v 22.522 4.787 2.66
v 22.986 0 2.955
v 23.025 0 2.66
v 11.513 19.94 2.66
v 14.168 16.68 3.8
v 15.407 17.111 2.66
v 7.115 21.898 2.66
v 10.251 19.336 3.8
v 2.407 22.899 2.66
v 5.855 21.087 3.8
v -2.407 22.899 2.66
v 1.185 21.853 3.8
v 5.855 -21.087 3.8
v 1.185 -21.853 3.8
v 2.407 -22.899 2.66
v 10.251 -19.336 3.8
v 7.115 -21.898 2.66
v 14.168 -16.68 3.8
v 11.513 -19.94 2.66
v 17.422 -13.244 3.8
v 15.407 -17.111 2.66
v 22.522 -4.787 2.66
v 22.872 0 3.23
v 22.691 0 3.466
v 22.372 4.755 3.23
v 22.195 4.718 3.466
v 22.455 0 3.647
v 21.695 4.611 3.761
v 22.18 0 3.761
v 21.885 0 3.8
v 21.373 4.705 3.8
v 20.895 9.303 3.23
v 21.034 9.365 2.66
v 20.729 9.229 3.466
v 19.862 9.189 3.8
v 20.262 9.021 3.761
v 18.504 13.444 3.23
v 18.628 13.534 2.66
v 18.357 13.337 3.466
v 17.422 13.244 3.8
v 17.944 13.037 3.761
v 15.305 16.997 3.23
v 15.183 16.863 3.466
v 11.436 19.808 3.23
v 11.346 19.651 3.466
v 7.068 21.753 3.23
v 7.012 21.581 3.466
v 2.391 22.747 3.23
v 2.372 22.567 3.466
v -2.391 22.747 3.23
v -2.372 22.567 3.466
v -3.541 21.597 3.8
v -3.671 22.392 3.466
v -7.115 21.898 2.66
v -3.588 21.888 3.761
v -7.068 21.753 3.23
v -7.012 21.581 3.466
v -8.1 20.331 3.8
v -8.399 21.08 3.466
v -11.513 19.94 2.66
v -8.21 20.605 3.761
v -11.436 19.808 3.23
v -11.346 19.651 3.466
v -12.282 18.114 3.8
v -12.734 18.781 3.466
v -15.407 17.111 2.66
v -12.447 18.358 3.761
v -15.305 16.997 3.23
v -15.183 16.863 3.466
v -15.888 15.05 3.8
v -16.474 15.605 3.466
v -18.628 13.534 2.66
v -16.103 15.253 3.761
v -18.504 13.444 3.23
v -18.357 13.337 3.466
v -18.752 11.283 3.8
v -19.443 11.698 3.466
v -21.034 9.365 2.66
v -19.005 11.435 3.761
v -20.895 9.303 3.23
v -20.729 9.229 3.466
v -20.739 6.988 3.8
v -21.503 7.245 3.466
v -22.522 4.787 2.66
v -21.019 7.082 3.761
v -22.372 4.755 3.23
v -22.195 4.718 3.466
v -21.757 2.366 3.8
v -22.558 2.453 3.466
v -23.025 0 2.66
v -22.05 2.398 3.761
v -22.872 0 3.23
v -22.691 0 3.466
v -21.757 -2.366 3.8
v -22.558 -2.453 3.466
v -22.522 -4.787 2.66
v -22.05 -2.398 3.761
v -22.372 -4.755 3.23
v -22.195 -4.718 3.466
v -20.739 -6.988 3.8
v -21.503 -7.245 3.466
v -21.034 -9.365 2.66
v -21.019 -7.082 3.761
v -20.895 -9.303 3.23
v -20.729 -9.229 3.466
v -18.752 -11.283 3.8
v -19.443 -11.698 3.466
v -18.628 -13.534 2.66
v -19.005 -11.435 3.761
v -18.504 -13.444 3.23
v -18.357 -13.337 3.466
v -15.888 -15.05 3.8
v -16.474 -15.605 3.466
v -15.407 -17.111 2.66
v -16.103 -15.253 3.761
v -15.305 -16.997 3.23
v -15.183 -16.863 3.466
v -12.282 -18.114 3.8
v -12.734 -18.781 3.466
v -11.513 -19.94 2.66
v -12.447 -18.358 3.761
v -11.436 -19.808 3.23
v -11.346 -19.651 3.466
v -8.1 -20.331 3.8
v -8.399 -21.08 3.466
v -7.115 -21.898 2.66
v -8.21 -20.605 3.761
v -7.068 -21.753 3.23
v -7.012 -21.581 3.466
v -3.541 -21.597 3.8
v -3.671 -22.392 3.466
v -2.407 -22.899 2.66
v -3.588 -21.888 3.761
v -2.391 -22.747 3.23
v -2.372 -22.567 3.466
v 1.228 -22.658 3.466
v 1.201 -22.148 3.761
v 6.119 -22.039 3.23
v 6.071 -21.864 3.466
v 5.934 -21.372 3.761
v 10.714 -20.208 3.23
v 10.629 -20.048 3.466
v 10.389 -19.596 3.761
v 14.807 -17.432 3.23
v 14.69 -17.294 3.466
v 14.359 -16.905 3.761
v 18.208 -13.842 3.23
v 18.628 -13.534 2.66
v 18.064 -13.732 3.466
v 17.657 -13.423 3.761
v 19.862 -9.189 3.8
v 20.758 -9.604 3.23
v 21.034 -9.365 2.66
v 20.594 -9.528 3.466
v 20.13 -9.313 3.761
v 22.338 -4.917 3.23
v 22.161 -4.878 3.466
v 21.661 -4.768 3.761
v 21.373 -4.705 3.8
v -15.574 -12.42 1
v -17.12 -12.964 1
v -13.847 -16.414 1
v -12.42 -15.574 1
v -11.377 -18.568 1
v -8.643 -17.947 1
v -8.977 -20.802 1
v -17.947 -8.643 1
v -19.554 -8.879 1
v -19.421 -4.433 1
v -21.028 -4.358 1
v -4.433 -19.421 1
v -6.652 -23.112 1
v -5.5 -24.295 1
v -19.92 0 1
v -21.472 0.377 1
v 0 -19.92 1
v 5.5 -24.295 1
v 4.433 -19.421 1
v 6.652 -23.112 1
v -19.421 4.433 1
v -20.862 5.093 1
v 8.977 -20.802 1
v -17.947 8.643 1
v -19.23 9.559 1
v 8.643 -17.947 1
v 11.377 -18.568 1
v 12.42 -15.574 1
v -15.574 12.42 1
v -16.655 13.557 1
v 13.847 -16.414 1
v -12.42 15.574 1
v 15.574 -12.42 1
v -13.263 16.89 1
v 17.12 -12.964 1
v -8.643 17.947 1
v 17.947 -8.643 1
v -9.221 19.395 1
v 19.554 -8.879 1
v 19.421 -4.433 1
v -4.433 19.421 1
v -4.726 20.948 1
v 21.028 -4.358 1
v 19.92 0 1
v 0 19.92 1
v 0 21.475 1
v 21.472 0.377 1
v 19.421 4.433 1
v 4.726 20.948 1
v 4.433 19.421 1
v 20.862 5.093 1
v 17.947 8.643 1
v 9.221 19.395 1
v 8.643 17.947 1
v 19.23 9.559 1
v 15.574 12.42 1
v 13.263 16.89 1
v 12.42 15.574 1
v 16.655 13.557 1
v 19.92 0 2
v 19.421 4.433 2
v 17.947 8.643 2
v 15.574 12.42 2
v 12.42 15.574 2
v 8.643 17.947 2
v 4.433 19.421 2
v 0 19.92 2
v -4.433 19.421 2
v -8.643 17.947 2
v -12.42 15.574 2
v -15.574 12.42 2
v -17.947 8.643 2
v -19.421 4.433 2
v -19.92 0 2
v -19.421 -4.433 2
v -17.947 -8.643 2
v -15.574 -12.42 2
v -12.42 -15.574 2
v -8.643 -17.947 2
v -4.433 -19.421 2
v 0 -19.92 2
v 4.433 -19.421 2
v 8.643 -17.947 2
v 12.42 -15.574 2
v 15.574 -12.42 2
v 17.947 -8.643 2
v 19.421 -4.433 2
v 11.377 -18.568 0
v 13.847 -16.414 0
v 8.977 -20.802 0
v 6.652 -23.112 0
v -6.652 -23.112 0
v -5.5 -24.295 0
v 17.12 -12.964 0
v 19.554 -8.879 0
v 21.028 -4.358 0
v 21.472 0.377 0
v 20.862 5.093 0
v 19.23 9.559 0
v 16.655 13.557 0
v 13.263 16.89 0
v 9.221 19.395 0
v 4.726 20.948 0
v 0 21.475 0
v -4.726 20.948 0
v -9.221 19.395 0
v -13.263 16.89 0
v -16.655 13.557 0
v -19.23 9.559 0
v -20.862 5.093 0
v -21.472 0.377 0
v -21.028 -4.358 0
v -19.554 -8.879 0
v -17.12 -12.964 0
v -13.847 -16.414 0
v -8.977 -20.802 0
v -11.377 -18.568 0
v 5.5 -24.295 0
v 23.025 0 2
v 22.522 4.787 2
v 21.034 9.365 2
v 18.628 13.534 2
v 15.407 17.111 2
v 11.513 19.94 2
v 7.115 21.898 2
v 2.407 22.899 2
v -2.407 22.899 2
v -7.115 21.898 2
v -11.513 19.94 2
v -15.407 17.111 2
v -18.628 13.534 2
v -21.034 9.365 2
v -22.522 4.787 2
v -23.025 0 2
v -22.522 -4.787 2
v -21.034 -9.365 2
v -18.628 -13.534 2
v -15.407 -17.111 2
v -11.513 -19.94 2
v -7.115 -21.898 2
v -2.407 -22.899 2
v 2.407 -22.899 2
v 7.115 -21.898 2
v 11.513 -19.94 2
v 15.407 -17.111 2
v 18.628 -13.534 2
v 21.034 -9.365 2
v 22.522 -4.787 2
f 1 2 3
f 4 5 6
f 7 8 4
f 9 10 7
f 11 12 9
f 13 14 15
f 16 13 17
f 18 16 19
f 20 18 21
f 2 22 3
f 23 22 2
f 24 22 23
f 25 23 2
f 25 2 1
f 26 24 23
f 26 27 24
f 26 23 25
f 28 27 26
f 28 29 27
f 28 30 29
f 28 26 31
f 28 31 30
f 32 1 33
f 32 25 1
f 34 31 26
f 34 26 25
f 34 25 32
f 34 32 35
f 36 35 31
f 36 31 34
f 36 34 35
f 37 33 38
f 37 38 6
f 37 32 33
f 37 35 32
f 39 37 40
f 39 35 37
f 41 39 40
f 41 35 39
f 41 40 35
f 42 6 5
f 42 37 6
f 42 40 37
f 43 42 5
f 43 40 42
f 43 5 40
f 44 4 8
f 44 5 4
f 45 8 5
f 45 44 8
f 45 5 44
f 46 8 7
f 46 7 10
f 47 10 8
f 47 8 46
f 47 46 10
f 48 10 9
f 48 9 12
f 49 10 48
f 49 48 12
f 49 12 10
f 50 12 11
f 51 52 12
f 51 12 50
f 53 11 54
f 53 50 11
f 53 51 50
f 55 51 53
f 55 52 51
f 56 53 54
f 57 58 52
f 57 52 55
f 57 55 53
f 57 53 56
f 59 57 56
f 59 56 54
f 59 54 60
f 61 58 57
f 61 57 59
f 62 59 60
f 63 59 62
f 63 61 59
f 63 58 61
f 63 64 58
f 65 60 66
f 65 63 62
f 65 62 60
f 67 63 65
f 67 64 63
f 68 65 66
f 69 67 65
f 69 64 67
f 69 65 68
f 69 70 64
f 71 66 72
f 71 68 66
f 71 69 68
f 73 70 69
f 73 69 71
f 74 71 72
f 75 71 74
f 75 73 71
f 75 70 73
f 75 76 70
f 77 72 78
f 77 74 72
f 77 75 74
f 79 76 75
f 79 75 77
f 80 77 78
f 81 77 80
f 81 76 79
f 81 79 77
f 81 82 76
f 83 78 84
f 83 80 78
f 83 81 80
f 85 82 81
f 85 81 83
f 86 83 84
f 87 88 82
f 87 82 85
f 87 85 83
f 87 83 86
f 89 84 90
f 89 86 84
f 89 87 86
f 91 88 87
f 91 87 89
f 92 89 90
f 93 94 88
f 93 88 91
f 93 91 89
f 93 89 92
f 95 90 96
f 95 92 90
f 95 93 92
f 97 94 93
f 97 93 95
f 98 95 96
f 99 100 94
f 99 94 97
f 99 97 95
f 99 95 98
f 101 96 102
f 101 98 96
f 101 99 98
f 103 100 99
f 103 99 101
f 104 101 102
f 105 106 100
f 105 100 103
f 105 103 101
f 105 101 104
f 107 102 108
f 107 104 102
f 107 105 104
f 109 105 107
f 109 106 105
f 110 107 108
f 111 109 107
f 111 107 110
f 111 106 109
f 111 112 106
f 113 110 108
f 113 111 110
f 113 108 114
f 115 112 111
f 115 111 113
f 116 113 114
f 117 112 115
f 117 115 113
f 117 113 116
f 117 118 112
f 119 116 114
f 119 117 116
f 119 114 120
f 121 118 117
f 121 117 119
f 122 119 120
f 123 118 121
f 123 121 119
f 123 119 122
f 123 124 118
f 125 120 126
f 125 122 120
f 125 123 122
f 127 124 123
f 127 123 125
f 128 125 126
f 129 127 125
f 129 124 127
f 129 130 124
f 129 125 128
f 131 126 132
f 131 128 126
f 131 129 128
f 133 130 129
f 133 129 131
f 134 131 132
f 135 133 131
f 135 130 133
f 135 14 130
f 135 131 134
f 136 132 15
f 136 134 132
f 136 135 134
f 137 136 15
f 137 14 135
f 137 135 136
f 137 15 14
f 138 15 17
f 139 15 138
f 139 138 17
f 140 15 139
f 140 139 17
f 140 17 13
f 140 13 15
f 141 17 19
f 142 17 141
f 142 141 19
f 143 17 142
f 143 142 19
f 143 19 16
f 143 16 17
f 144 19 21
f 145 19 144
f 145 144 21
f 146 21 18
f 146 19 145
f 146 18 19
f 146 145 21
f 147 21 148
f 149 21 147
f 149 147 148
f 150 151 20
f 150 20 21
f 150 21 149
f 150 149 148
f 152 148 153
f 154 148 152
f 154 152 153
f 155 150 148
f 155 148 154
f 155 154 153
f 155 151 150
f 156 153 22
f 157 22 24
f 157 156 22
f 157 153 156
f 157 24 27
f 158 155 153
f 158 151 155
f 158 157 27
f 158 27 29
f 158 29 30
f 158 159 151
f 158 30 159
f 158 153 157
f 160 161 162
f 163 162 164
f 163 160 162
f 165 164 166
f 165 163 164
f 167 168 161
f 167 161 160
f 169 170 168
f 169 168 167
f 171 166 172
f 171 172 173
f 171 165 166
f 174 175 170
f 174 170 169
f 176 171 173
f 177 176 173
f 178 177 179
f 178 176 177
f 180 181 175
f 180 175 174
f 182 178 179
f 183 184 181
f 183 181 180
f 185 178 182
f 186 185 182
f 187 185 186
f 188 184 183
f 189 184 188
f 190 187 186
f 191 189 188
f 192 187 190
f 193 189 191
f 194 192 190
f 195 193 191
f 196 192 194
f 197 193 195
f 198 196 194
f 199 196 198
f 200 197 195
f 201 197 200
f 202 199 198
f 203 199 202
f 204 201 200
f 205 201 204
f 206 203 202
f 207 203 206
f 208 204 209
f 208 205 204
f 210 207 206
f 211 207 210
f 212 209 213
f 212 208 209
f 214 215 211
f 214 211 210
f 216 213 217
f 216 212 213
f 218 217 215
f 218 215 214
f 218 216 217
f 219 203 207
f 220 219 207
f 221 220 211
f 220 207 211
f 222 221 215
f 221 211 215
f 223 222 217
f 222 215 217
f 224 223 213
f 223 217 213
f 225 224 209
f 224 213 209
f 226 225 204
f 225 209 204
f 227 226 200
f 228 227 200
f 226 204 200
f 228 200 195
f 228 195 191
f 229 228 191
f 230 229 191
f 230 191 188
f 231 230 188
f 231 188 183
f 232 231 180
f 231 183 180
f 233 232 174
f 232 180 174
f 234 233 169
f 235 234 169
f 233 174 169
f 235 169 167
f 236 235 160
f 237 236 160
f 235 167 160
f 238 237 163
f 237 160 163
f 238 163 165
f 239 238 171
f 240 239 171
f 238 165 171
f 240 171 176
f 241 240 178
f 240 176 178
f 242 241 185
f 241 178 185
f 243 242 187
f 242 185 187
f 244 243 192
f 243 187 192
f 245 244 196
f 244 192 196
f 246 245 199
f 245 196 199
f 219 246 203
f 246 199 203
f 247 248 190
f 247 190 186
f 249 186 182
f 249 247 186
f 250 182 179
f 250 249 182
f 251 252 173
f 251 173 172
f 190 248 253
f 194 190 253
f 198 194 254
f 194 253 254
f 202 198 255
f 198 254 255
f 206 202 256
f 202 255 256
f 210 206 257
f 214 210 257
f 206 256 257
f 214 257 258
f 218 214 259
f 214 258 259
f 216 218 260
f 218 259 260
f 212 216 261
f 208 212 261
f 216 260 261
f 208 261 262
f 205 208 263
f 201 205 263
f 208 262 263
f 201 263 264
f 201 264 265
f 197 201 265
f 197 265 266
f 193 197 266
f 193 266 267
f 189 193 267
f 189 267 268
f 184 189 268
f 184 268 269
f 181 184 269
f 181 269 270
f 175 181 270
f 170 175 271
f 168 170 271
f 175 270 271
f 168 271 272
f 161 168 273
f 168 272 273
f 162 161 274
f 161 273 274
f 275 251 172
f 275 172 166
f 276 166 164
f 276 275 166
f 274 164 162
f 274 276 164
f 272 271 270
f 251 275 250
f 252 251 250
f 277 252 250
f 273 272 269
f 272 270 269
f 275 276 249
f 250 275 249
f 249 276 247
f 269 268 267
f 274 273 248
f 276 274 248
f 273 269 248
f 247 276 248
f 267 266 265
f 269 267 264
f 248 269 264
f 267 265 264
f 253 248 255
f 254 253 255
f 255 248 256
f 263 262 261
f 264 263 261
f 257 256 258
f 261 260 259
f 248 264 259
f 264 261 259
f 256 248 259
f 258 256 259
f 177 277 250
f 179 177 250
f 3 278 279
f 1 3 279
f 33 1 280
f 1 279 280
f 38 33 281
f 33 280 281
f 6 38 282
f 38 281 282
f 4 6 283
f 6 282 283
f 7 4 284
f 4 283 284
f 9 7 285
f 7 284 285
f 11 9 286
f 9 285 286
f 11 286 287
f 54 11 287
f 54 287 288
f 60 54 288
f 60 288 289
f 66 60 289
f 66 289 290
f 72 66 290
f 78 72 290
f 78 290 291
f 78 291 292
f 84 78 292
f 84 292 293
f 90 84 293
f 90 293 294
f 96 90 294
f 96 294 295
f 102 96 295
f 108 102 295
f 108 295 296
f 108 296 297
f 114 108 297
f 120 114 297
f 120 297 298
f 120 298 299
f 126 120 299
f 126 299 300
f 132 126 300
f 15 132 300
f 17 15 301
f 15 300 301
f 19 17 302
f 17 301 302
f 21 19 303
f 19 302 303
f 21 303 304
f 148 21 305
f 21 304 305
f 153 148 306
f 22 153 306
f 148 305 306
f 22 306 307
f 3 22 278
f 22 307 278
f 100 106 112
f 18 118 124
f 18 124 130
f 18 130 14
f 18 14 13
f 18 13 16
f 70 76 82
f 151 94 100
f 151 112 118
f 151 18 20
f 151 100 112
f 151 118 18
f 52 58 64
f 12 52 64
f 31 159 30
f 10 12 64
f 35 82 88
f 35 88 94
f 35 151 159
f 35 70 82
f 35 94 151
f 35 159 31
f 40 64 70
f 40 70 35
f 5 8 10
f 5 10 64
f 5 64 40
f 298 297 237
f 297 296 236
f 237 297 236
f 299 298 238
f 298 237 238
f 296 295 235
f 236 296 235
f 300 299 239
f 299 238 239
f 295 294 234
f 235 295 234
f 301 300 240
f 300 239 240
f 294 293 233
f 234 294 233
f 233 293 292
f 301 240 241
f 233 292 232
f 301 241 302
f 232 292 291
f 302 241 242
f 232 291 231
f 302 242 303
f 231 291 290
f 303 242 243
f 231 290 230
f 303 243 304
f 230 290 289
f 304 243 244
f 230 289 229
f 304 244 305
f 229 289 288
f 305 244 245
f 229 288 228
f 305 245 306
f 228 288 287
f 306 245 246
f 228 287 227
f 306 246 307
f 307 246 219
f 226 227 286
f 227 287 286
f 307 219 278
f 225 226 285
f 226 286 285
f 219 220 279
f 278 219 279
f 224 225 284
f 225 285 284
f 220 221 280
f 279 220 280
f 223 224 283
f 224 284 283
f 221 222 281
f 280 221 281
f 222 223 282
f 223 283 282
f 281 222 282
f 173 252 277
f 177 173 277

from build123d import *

# Parameters (mm, degrees)
PAD_DEPTH    = 1
SKETCH001_R  = 19.92
PAD001_DEPTH = 1
SKETCH002_R  = 23.025
PAD002_DEPTH = 0.65
SKETCH003_R  = 23.025
PAD003_DEPTH = 1.15
FILLET_R     = 1.14


with BuildPart() as part:
    # Sketch → Pad (new body)
    with BuildSketch(Plane.XY):
        with BuildLine():
            ThreePointArc((13.847311, -16.41425), (0, 21.475), (-13.847311, -16.41425))
            ThreePointArc((-6.652084, -23.112353), (-10.16787, -19.675401), (-13.847311, -16.41425))
            Line((-5.5, -24.295), (-6.652084, -23.112353))
            Line((-5.5, -24.295), (5.5, -24.295))
            Line((5.5, -24.295), (6.652084, -23.112353))
            ThreePointArc((13.847311, -16.41425), (10.16787, -19.675401), (6.652084, -23.112353))
        make_face()
    extrude(amount=PAD_DEPTH)

    # Sketch001 (on Face8 of Pad) → Pad001 (join)
    with BuildSketch(Plane.XY.offset(1)):
        Circle(SKETCH001_R)
    extrude(amount=PAD001_DEPTH)

    # Sketch002 (on Face10 of Pad001) → Pad002 (join)
    with BuildSketch(Plane.XY.offset(2)):
        Circle(SKETCH002_R)
    extrude(amount=PAD002_DEPTH)

    # Sketch003 (on Face3 of Pad002) → Pad003 (join)
    with BuildSketch(Plane.XY.offset(2.65)):
        Circle(SKETCH003_R)
    extrude(amount=PAD003_DEPTH)

    # Fillet
    fillet_edges = [part.edges().sort_by_distance(p)[0] for p in [
        (-23.025, 0, 3.8),
    ]]
    fillet(fillet_edges, radius=FILLET_R)


solid = part.part
